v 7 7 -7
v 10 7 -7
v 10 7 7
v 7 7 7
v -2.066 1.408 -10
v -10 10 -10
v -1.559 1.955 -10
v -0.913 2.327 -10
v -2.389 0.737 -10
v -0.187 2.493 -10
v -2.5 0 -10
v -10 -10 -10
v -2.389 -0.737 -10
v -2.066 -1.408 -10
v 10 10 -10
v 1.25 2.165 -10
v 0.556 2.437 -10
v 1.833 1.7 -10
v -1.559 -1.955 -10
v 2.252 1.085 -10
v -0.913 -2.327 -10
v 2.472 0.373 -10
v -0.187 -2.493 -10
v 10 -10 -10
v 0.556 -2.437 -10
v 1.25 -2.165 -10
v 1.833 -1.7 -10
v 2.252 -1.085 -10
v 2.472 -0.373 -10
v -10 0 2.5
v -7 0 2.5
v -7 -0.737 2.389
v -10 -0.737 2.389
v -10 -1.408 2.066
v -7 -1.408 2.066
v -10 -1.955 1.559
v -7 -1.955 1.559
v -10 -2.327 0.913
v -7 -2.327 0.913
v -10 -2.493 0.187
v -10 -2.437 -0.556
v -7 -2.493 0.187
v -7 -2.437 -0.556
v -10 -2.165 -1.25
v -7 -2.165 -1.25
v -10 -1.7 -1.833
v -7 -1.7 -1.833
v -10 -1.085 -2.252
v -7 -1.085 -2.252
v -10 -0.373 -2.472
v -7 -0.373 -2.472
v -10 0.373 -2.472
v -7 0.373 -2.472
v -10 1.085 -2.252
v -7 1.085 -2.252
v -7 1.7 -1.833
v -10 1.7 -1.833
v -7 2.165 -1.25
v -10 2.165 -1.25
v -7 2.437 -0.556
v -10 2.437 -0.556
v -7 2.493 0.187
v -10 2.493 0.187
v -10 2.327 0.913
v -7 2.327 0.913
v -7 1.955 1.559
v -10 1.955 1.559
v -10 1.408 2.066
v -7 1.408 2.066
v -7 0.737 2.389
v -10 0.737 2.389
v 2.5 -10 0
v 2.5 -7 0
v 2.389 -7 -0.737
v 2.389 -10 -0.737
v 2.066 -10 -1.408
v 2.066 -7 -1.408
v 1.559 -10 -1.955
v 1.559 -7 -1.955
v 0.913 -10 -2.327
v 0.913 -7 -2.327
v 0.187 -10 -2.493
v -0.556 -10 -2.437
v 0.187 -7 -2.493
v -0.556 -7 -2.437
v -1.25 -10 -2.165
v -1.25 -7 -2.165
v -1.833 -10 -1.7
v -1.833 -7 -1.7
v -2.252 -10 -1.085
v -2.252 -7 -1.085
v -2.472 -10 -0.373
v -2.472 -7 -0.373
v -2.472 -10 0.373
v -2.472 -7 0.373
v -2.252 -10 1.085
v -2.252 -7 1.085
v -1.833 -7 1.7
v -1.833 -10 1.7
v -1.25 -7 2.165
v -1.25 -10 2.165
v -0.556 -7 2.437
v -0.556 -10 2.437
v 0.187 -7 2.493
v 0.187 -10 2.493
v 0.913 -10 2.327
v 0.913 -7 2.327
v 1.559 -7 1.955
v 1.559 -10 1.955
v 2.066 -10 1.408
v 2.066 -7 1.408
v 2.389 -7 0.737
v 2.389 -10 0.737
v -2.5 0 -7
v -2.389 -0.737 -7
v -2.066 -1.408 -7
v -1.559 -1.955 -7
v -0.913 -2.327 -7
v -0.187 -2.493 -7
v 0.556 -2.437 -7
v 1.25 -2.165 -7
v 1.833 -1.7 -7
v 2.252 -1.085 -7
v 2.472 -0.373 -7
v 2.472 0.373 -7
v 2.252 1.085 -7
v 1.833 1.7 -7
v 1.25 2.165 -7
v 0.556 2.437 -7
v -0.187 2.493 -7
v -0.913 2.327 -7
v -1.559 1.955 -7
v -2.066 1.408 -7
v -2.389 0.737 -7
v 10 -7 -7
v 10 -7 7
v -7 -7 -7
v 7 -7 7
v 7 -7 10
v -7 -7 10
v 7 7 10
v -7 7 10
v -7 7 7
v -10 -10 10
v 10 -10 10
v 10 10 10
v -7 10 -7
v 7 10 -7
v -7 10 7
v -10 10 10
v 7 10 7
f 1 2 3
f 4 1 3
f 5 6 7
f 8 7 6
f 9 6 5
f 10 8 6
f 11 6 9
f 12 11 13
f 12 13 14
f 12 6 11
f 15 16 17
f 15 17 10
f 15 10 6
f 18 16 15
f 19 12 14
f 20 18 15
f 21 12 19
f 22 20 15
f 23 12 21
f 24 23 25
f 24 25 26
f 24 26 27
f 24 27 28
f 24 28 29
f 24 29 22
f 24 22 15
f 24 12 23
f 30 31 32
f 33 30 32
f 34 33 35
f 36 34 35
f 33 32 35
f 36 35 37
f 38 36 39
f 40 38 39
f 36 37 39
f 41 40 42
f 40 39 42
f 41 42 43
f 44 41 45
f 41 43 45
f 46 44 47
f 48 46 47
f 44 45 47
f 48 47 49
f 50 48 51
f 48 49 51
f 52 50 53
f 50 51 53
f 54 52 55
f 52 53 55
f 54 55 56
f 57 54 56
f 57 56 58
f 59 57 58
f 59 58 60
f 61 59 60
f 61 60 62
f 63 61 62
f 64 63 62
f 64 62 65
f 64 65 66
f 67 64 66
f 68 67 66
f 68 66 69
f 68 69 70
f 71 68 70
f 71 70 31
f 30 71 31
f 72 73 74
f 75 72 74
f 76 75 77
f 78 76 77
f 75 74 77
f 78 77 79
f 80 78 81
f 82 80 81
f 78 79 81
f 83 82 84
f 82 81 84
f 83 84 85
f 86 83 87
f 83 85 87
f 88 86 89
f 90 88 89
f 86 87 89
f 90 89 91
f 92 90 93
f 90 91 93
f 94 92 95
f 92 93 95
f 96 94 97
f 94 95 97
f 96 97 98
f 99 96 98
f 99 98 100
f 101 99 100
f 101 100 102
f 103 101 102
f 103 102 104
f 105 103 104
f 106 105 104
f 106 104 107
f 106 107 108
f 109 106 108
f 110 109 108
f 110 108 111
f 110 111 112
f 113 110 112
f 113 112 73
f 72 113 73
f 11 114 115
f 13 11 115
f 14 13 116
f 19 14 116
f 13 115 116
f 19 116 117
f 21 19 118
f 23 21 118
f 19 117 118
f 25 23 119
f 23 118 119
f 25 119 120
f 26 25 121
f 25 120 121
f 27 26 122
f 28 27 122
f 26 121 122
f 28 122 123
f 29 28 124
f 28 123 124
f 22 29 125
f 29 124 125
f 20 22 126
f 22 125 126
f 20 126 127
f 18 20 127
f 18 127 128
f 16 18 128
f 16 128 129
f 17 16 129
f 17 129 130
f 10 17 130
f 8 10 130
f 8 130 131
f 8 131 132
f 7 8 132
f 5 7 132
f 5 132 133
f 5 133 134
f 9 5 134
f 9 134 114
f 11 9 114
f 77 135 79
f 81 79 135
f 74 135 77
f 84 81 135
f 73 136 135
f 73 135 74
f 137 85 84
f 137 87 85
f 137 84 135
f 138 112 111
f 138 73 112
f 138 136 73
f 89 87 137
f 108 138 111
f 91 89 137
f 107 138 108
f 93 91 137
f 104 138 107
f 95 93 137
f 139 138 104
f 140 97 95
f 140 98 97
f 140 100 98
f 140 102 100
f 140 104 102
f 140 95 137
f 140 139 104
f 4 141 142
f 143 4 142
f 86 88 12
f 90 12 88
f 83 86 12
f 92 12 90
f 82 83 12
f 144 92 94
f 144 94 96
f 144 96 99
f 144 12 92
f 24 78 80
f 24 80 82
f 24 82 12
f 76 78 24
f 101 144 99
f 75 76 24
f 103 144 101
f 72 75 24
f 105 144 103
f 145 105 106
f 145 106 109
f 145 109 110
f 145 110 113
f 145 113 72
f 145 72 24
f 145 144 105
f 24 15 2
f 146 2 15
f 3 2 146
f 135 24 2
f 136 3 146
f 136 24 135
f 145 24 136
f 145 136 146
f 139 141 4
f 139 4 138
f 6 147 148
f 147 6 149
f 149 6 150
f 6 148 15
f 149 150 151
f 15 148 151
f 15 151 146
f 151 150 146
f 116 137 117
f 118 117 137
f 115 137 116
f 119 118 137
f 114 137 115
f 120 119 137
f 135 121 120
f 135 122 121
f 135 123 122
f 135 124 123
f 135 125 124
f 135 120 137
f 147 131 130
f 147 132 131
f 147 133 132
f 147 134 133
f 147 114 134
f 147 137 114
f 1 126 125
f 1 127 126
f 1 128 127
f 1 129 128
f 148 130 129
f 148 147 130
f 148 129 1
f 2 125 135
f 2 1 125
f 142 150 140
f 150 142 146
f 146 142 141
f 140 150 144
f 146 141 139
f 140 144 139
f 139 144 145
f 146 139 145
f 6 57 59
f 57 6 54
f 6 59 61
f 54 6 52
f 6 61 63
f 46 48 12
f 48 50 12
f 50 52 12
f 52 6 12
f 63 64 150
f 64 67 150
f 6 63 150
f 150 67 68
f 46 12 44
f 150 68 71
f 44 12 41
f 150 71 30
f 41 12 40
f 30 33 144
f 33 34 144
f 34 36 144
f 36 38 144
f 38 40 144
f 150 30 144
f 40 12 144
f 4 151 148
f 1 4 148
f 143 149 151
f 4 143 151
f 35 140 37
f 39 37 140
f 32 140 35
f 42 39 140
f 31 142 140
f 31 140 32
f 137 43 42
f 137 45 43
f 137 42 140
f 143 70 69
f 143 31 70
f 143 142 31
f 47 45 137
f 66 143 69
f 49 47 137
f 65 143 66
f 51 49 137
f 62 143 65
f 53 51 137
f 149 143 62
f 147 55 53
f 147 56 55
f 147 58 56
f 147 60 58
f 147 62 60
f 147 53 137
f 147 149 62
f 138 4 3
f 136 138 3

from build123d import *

# Parameters (mm, degrees)
SKETCH033_W     = 20
SKETCH033_H     = 20
PAD015_DEPTH    = 10
SKETCH034_R     = 2.5
HOLE009_DEPTH   = 25
SKETCH035_R     = 2.5
HOLE010_DEPTH   = 25
SKETCH036_R     = 2.5
HOLE011_DEPTH   = 25
SKETCH037_W     = 14
SKETCH037_H     = 14
POCKET009_DEPTH = 17
SKETCH038_W     = 14
SKETCH038_H     = 14
POCKET010_DEPTH = 17
SKETCH039_W     = 14
SKETCH039_H     = 14
POCKET011_DEPTH = 17


with BuildPart() as part:
    # Sketch033 → Pad015 (new body, symmetric)
    with BuildSketch(Plane.XZ):
        Rectangle(SKETCH033_W, SKETCH033_H)
    extrude(amount=PAD015_DEPTH, both=True)

    # Sketch034 (on Face1 of Pad015) → Hole009 (cut)
    with BuildSketch(Plane(origin=(0, 0, 10), x_dir=(-1, 0, 0), z_dir=(0, 0, 1))):
        Circle(SKETCH034_R)
    extrude(amount=-HOLE009_DEPTH, mode=Mode.SUBTRACT)

    # Sketch035 (on Face2 of Hole009) → Hole010 (cut)
    with BuildSketch(Plane(origin=(10, 0, 0), x_dir=(0, 0, 1), z_dir=(1, 0, 0))):
        Circle(SKETCH035_R)
    extrude(amount=-HOLE010_DEPTH, mode=Mode.SUBTRACT)

    # Sketch036 (on Face3 of Hole009) → Hole011 (cut)
    with BuildSketch(Plane(origin=(0, 10, 0), x_dir=(1, 0, 0), z_dir=(0, 1, 0))):
        Circle(SKETCH036_R)
    extrude(amount=-HOLE011_DEPTH, mode=Mode.SUBTRACT)

    # Sketch037 (on Face2 of Hole011) → Pocket009 (cut)
    with BuildSketch(Plane(origin=(10, 0, 0), x_dir=(0, 0, 1), z_dir=(1, 0, 0))):
        Rectangle(SKETCH037_W, SKETCH037_H)
    extrude(amount=-POCKET009_DEPTH, mode=Mode.SUBTRACT)

    # Sketch038 (on Face3 of Pocket009) → Pocket010 (cut)
    with BuildSketch(Plane(origin=(0, 10, 0), x_dir=(1, 0, 0), z_dir=(0, 1, 0))):
        Rectangle(SKETCH038_W, SKETCH038_H)
    extrude(amount=-POCKET010_DEPTH, mode=Mode.SUBTRACT)

    # Sketch039 (on Face1 of Pocket010) → Pocket011 (cut)
    with BuildSketch(Plane(origin=(0, 0, 10), x_dir=(-1, 0, 0), z_dir=(0, 0, 1))):
        Rectangle(SKETCH039_W, SKETCH039_H)
    extrude(amount=-POCKET011_DEPTH, mode=Mode.SUBTRACT)


solid = part.part
